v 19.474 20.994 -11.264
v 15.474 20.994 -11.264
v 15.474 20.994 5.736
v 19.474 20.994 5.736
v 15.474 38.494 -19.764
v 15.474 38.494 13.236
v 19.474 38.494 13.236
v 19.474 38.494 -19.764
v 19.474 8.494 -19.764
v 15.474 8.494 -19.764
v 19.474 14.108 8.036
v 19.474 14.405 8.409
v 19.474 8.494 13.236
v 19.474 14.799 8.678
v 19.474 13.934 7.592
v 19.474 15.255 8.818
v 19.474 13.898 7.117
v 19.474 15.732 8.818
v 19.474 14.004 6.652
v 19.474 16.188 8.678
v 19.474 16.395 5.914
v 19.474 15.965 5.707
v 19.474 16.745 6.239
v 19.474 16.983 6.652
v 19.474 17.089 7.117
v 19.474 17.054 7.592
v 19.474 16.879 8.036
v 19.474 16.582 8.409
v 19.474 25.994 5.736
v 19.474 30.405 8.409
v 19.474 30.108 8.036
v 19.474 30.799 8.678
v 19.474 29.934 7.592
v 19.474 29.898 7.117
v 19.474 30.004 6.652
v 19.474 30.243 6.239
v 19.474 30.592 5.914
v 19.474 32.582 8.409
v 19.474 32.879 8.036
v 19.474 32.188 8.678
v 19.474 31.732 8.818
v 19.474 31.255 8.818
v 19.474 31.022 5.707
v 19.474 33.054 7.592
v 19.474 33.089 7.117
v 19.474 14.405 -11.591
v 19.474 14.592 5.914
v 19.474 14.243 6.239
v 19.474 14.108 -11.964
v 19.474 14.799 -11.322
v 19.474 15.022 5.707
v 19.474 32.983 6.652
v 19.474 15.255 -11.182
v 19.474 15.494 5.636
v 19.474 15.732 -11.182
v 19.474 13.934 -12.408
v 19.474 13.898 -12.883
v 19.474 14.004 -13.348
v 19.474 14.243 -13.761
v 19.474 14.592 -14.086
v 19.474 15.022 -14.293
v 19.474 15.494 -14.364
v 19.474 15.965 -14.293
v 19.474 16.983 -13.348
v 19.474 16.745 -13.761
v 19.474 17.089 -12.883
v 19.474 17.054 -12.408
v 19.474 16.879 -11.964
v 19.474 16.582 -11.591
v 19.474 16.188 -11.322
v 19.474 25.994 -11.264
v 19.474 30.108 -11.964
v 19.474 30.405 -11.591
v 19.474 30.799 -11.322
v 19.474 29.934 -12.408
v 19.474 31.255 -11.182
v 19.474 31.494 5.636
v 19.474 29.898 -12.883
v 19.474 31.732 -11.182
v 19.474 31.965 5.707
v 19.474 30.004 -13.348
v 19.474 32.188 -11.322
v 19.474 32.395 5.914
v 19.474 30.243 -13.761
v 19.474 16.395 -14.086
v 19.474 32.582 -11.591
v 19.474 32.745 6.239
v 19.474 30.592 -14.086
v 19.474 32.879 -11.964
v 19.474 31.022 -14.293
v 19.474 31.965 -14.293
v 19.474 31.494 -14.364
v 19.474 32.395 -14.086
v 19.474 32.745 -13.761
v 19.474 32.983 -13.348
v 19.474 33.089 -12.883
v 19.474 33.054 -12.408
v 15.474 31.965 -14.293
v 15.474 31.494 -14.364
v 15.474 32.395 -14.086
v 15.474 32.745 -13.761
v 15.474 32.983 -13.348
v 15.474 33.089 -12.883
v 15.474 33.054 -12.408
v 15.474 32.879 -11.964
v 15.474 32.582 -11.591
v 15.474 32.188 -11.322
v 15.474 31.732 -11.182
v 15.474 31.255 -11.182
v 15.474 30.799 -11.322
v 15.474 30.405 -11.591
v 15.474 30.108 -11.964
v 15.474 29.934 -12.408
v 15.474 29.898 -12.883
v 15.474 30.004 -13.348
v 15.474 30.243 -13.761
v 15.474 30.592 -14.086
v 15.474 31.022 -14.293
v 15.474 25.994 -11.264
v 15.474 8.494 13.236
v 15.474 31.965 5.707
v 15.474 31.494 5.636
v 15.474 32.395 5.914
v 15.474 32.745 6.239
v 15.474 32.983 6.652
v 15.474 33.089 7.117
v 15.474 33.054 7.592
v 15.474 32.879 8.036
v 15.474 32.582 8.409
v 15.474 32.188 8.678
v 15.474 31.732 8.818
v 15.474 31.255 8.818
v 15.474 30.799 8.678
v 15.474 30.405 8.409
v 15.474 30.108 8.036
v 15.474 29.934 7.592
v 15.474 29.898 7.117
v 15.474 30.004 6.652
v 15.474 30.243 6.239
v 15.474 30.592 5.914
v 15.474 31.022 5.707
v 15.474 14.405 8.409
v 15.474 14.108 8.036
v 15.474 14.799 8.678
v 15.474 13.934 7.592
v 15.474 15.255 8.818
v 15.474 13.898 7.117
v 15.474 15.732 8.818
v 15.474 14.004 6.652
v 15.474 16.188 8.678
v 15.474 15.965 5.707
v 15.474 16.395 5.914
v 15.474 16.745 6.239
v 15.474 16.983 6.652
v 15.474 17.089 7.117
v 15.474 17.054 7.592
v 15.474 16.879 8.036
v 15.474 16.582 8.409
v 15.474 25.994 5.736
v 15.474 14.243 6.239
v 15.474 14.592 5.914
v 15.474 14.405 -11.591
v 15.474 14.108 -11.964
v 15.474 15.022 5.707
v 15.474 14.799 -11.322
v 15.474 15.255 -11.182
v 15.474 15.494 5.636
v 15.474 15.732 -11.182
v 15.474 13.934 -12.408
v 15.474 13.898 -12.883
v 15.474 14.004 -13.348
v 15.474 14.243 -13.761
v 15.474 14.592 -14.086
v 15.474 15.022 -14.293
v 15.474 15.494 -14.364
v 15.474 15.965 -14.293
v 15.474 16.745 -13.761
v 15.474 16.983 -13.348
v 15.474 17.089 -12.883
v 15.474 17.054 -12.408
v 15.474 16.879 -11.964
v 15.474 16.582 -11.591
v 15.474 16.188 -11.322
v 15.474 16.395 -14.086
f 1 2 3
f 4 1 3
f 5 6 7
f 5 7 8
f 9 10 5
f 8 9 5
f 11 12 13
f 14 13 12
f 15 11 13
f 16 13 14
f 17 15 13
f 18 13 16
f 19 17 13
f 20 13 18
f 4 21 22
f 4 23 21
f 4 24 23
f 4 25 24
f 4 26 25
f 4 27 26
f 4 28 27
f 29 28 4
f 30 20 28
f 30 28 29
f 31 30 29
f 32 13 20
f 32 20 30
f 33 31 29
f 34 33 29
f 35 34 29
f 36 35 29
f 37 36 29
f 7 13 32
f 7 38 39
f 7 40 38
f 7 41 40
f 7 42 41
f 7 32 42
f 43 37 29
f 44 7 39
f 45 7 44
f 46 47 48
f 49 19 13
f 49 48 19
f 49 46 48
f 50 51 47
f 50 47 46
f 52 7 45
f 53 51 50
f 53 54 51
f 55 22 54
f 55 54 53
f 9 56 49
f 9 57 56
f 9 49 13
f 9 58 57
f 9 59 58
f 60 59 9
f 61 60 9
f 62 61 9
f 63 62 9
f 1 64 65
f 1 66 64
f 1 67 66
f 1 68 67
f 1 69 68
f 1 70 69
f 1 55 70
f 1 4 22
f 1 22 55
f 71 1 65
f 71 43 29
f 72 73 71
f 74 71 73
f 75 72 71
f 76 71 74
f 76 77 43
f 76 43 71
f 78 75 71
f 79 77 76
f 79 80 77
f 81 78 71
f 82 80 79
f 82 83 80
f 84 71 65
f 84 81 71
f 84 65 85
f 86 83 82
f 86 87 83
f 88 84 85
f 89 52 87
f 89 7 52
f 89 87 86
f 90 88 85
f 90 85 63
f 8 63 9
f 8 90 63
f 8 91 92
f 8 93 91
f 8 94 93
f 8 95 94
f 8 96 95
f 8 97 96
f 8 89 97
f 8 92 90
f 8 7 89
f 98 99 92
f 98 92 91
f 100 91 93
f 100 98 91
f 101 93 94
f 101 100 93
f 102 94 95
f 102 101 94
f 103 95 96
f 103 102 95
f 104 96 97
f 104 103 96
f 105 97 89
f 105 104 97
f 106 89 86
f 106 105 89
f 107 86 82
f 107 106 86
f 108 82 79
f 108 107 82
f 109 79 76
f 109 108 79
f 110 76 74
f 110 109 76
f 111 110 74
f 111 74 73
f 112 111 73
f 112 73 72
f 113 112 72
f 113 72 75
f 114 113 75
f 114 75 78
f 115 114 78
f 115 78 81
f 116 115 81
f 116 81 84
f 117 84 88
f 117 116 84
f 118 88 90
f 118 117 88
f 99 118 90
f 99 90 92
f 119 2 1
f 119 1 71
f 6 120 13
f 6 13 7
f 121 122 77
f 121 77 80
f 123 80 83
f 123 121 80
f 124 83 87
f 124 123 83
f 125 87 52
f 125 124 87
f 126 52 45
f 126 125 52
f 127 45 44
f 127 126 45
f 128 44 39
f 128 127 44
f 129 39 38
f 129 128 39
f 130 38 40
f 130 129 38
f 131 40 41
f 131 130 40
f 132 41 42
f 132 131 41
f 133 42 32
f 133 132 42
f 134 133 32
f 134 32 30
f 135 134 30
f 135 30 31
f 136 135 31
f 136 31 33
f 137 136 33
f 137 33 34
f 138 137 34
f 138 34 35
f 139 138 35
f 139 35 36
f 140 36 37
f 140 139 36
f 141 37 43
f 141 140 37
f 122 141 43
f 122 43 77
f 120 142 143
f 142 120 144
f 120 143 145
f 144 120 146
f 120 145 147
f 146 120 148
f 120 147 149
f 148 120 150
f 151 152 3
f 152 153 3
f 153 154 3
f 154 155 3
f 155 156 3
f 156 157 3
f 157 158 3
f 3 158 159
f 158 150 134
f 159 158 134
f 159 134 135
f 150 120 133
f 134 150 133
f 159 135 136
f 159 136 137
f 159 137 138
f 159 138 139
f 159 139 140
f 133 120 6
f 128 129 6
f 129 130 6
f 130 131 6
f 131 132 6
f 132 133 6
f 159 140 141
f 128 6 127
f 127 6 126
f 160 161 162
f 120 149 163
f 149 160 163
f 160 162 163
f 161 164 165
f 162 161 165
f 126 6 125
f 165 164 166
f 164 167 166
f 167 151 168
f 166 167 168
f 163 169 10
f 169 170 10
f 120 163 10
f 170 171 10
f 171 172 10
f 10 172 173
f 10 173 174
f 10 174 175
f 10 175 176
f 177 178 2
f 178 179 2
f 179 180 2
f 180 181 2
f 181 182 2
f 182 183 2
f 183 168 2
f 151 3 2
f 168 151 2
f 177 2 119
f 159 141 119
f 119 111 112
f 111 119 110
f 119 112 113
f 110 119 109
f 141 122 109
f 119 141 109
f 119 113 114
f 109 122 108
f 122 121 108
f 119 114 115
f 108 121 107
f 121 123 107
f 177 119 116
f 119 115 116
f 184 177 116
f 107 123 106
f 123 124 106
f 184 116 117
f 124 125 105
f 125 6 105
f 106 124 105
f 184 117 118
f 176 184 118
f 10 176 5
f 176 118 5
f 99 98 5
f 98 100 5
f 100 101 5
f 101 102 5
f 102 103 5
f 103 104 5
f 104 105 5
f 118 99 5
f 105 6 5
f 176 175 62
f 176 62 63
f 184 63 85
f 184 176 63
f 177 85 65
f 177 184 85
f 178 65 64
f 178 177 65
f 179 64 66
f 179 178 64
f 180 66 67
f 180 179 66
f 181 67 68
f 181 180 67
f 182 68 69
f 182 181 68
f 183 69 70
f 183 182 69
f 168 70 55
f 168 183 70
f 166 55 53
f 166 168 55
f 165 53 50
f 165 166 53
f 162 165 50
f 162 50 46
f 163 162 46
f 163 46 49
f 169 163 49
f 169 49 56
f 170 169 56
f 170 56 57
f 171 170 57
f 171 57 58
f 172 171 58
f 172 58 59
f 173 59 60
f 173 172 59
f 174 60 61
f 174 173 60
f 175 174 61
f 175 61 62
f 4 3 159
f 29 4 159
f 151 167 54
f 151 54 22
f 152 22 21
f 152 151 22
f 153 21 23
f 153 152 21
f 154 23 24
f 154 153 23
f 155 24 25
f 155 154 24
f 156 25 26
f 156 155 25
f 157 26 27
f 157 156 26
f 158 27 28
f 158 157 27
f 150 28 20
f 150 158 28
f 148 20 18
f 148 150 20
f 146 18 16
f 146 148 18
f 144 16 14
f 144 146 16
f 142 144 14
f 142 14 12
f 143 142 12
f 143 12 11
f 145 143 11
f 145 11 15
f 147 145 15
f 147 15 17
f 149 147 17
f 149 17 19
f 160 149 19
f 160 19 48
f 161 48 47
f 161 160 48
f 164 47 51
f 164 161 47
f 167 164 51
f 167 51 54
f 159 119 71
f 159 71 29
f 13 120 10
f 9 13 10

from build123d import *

# Parameters (mm, degrees)
SKETCH_1_W         = 33
SKETCH_1_H         = 30
SKETCH_1_R         = 1.6
EXTRUDE_1_DEPTH    = 4
SKETCH2_W          = 17
SKETCH2_H          = 5
CUT_EXTRUDE2_DEPTH = 5


with BuildPart() as part:
    # Эскиз1 → Бобышка-Вытянуть1 (new body)
    with BuildSketch(Plane(origin=(15.473923778, 0, 0), x_dir=(0, 0, -1), z_dir=(1, 0, 0))):
        with Locations((3.263696673, 23.493617857)):
            Rectangle(SKETCH_1_W, SKETCH_1_H)
        with Locations((-7.236303327, 31.493617857)):
            Circle(SKETCH_1_R, mode=Mode.SUBTRACT)
        with Locations((12.763696673, 31.493617857)):
            Circle(SKETCH_1_R, mode=Mode.SUBTRACT)
        with Locations((-7.236303327, 15.493617857)):
            Circle(SKETCH_1_R, mode=Mode.SUBTRACT)
        with Locations((12.763696673, 15.493617857)):
            Circle(SKETCH_1_R, mode=Mode.SUBTRACT)
    extrude(amount=EXTRUDE_1_DEPTH)

    # Sketch2 → Cut-Extrude2 (cut, through all)
    with BuildSketch(Plane.ZY.offset(-15.473923778)):
        with Locations((-2.763696673, 23.493617857)):
            Rectangle(SKETCH2_W, SKETCH2_H)
    extrude(amount=-CUT_EXTRUDE2_DEPTH, mode=Mode.SUBTRACT)


solid = part.part
